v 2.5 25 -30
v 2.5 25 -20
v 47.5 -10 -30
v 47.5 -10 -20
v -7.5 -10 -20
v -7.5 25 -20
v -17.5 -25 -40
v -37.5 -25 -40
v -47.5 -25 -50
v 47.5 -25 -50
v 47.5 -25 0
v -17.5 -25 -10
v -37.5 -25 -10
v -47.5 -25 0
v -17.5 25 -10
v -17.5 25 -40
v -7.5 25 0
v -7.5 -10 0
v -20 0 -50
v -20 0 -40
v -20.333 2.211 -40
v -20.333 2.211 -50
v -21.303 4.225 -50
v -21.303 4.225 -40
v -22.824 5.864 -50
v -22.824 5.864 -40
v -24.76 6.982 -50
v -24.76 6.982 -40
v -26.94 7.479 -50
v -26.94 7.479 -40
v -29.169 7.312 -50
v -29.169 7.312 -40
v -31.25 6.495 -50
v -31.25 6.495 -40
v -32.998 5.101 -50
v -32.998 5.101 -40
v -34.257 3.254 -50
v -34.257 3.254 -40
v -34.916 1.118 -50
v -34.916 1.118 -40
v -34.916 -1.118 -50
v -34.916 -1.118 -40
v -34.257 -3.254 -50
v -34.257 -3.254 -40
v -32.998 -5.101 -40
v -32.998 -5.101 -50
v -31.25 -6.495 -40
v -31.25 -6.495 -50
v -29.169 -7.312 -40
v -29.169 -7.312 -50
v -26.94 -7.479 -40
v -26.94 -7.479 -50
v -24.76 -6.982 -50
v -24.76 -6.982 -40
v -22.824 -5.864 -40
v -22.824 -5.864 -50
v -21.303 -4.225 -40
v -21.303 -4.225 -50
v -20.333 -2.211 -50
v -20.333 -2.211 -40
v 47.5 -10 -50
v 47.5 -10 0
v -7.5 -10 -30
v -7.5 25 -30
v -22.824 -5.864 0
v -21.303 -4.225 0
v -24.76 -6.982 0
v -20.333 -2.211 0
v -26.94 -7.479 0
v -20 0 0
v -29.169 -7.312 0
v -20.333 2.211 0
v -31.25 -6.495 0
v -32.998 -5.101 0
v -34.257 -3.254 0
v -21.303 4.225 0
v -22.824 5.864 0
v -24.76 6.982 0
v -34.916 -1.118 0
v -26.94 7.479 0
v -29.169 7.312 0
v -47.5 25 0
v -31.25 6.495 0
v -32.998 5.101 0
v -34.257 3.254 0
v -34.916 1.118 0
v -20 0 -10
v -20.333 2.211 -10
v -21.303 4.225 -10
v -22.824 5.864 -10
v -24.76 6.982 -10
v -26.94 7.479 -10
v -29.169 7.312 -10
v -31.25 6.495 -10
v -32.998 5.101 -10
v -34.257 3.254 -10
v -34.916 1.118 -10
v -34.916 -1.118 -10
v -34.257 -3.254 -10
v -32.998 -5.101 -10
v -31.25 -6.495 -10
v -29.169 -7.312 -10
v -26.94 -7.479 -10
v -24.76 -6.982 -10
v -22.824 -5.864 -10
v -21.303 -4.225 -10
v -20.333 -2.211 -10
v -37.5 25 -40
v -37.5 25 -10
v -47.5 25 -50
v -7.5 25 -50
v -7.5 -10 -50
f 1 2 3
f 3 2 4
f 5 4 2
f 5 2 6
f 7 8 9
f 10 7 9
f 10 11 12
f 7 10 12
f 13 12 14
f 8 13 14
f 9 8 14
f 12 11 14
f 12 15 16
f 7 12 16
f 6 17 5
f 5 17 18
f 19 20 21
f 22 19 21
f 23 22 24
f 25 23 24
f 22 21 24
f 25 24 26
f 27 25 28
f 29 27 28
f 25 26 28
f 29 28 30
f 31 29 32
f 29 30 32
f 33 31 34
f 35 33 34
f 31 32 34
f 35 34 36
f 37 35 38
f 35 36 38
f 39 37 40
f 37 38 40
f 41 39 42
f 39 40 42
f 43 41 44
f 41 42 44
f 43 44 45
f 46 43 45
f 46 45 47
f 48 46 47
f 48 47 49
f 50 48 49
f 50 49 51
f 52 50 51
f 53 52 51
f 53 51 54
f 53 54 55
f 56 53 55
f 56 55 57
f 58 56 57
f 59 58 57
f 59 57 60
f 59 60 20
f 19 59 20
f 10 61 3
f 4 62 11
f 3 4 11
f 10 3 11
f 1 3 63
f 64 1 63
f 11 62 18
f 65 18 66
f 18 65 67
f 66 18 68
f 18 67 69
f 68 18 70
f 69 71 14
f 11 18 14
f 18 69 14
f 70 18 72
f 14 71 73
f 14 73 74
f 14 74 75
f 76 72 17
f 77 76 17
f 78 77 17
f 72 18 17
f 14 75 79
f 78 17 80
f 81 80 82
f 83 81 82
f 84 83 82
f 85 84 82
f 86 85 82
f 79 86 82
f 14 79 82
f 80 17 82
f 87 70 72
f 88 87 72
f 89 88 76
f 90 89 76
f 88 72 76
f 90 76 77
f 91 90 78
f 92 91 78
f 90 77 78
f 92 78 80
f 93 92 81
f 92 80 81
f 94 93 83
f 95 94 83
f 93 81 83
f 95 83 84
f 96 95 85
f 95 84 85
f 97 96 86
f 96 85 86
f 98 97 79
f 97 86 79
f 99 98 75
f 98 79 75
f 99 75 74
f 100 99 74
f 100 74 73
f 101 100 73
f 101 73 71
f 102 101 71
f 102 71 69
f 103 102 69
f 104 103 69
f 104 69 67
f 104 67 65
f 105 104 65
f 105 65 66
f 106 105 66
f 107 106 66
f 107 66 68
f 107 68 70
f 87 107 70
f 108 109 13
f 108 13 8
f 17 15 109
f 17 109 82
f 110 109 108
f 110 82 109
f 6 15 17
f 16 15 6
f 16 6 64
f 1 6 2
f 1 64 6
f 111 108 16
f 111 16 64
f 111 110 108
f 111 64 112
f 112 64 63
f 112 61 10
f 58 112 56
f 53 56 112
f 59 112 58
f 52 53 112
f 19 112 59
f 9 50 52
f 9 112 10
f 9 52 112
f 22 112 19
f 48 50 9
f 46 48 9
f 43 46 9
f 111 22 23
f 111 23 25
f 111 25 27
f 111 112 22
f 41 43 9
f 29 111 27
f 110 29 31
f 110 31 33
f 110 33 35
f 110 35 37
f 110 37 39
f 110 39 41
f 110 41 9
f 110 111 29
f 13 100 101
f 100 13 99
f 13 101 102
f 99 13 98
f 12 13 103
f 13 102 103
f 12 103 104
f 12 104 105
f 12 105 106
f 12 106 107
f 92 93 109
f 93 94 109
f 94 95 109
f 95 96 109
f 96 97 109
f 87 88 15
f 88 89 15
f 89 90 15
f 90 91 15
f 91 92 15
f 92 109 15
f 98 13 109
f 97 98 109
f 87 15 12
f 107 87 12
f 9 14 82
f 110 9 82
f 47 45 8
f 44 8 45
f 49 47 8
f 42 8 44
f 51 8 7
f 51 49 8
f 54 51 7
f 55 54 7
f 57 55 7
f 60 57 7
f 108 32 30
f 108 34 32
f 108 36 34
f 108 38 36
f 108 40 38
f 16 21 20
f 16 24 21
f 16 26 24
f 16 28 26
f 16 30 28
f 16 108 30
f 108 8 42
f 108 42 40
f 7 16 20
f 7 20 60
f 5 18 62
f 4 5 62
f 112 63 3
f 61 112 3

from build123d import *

# Parameters (mm, degrees)
BOSS_EXTRUDE1_DEPTH = 50
SKETCH2_W           = 20
SKETCH2_H           = 30
CUT_EXTRUDE1_DEPTH  = 50
SKETCH3_R           = 7.5
CUT_EXTRUDE2_DEPTH  = 50
SKETCH4_W           = 10
SKETCH4_H           = 10
BOSS_EXTRUDE2_DEPTH = 40
EXTRUDE_THIN1_DEPTH = 10
BOSS_EXTRUDE3_DEPTH = 10


with BuildPart() as part:
    # Sketch1 → Boss-Extrude1 (new body)
    with BuildSketch(Plane.XY):
        Polygon((-7.5, 25), (-7.5, -10), (47.5, -10), (47.5, -25), (-47.5, -25), (-47.5, 25), align=None)
    extrude(amount=-BOSS_EXTRUDE1_DEPTH)

    # Sketch2 → Cut-Extrude1 (cut)
    with BuildSketch(Plane(origin=(0, 25, 0), x_dir=(1, 0, 0), z_dir=(0, 1, 0))):
        with Locations((-27.5, 25)):
            Rectangle(SKETCH2_W, SKETCH2_H)
    extrude(amount=-CUT_EXTRUDE1_DEPTH, mode=Mode.SUBTRACT)

    # Sketch3 → Cut-Extrude2 (cut)
    with BuildSketch(Plane.XY):
        with Locations((-27.5, 0)):
            Circle(SKETCH3_R)
    extrude(amount=-CUT_EXTRUDE2_DEPTH, mode=Mode.SUBTRACT)

    # Sketch4 → Boss-Extrude2 (add)
    with BuildSketch(Plane(origin=(0, 25, 0), x_dir=(1, 0, 0), z_dir=(0, 1, 0))):
        with Locations((-2.5, 25)):
            Rectangle(SKETCH4_W, SKETCH4_H)
    extrude(amount=-BOSS_EXTRUDE2_DEPTH)

    # Sketch7 → Extrude-Thin1 (add)
    with BuildSketch(Plane.XY.offset(-20)):
        Polygon((2.5, 25), (47.5, -10), (41.360593865, -17.893522174), (-3.639406135, 17.106477826), align=None)
    extrude(amount=-EXTRUDE_THIN1_DEPTH)

    # Sketch8 → Boss-Extrude3 (add)
    with BuildSketch(Plane.XY.offset(-20)):
        Polygon((2.5, -10), (2.5, 12.331384166), (31.211779641, -10), align=None)
    extrude(amount=-BOSS_EXTRUDE3_DEPTH)


solid = part.part
